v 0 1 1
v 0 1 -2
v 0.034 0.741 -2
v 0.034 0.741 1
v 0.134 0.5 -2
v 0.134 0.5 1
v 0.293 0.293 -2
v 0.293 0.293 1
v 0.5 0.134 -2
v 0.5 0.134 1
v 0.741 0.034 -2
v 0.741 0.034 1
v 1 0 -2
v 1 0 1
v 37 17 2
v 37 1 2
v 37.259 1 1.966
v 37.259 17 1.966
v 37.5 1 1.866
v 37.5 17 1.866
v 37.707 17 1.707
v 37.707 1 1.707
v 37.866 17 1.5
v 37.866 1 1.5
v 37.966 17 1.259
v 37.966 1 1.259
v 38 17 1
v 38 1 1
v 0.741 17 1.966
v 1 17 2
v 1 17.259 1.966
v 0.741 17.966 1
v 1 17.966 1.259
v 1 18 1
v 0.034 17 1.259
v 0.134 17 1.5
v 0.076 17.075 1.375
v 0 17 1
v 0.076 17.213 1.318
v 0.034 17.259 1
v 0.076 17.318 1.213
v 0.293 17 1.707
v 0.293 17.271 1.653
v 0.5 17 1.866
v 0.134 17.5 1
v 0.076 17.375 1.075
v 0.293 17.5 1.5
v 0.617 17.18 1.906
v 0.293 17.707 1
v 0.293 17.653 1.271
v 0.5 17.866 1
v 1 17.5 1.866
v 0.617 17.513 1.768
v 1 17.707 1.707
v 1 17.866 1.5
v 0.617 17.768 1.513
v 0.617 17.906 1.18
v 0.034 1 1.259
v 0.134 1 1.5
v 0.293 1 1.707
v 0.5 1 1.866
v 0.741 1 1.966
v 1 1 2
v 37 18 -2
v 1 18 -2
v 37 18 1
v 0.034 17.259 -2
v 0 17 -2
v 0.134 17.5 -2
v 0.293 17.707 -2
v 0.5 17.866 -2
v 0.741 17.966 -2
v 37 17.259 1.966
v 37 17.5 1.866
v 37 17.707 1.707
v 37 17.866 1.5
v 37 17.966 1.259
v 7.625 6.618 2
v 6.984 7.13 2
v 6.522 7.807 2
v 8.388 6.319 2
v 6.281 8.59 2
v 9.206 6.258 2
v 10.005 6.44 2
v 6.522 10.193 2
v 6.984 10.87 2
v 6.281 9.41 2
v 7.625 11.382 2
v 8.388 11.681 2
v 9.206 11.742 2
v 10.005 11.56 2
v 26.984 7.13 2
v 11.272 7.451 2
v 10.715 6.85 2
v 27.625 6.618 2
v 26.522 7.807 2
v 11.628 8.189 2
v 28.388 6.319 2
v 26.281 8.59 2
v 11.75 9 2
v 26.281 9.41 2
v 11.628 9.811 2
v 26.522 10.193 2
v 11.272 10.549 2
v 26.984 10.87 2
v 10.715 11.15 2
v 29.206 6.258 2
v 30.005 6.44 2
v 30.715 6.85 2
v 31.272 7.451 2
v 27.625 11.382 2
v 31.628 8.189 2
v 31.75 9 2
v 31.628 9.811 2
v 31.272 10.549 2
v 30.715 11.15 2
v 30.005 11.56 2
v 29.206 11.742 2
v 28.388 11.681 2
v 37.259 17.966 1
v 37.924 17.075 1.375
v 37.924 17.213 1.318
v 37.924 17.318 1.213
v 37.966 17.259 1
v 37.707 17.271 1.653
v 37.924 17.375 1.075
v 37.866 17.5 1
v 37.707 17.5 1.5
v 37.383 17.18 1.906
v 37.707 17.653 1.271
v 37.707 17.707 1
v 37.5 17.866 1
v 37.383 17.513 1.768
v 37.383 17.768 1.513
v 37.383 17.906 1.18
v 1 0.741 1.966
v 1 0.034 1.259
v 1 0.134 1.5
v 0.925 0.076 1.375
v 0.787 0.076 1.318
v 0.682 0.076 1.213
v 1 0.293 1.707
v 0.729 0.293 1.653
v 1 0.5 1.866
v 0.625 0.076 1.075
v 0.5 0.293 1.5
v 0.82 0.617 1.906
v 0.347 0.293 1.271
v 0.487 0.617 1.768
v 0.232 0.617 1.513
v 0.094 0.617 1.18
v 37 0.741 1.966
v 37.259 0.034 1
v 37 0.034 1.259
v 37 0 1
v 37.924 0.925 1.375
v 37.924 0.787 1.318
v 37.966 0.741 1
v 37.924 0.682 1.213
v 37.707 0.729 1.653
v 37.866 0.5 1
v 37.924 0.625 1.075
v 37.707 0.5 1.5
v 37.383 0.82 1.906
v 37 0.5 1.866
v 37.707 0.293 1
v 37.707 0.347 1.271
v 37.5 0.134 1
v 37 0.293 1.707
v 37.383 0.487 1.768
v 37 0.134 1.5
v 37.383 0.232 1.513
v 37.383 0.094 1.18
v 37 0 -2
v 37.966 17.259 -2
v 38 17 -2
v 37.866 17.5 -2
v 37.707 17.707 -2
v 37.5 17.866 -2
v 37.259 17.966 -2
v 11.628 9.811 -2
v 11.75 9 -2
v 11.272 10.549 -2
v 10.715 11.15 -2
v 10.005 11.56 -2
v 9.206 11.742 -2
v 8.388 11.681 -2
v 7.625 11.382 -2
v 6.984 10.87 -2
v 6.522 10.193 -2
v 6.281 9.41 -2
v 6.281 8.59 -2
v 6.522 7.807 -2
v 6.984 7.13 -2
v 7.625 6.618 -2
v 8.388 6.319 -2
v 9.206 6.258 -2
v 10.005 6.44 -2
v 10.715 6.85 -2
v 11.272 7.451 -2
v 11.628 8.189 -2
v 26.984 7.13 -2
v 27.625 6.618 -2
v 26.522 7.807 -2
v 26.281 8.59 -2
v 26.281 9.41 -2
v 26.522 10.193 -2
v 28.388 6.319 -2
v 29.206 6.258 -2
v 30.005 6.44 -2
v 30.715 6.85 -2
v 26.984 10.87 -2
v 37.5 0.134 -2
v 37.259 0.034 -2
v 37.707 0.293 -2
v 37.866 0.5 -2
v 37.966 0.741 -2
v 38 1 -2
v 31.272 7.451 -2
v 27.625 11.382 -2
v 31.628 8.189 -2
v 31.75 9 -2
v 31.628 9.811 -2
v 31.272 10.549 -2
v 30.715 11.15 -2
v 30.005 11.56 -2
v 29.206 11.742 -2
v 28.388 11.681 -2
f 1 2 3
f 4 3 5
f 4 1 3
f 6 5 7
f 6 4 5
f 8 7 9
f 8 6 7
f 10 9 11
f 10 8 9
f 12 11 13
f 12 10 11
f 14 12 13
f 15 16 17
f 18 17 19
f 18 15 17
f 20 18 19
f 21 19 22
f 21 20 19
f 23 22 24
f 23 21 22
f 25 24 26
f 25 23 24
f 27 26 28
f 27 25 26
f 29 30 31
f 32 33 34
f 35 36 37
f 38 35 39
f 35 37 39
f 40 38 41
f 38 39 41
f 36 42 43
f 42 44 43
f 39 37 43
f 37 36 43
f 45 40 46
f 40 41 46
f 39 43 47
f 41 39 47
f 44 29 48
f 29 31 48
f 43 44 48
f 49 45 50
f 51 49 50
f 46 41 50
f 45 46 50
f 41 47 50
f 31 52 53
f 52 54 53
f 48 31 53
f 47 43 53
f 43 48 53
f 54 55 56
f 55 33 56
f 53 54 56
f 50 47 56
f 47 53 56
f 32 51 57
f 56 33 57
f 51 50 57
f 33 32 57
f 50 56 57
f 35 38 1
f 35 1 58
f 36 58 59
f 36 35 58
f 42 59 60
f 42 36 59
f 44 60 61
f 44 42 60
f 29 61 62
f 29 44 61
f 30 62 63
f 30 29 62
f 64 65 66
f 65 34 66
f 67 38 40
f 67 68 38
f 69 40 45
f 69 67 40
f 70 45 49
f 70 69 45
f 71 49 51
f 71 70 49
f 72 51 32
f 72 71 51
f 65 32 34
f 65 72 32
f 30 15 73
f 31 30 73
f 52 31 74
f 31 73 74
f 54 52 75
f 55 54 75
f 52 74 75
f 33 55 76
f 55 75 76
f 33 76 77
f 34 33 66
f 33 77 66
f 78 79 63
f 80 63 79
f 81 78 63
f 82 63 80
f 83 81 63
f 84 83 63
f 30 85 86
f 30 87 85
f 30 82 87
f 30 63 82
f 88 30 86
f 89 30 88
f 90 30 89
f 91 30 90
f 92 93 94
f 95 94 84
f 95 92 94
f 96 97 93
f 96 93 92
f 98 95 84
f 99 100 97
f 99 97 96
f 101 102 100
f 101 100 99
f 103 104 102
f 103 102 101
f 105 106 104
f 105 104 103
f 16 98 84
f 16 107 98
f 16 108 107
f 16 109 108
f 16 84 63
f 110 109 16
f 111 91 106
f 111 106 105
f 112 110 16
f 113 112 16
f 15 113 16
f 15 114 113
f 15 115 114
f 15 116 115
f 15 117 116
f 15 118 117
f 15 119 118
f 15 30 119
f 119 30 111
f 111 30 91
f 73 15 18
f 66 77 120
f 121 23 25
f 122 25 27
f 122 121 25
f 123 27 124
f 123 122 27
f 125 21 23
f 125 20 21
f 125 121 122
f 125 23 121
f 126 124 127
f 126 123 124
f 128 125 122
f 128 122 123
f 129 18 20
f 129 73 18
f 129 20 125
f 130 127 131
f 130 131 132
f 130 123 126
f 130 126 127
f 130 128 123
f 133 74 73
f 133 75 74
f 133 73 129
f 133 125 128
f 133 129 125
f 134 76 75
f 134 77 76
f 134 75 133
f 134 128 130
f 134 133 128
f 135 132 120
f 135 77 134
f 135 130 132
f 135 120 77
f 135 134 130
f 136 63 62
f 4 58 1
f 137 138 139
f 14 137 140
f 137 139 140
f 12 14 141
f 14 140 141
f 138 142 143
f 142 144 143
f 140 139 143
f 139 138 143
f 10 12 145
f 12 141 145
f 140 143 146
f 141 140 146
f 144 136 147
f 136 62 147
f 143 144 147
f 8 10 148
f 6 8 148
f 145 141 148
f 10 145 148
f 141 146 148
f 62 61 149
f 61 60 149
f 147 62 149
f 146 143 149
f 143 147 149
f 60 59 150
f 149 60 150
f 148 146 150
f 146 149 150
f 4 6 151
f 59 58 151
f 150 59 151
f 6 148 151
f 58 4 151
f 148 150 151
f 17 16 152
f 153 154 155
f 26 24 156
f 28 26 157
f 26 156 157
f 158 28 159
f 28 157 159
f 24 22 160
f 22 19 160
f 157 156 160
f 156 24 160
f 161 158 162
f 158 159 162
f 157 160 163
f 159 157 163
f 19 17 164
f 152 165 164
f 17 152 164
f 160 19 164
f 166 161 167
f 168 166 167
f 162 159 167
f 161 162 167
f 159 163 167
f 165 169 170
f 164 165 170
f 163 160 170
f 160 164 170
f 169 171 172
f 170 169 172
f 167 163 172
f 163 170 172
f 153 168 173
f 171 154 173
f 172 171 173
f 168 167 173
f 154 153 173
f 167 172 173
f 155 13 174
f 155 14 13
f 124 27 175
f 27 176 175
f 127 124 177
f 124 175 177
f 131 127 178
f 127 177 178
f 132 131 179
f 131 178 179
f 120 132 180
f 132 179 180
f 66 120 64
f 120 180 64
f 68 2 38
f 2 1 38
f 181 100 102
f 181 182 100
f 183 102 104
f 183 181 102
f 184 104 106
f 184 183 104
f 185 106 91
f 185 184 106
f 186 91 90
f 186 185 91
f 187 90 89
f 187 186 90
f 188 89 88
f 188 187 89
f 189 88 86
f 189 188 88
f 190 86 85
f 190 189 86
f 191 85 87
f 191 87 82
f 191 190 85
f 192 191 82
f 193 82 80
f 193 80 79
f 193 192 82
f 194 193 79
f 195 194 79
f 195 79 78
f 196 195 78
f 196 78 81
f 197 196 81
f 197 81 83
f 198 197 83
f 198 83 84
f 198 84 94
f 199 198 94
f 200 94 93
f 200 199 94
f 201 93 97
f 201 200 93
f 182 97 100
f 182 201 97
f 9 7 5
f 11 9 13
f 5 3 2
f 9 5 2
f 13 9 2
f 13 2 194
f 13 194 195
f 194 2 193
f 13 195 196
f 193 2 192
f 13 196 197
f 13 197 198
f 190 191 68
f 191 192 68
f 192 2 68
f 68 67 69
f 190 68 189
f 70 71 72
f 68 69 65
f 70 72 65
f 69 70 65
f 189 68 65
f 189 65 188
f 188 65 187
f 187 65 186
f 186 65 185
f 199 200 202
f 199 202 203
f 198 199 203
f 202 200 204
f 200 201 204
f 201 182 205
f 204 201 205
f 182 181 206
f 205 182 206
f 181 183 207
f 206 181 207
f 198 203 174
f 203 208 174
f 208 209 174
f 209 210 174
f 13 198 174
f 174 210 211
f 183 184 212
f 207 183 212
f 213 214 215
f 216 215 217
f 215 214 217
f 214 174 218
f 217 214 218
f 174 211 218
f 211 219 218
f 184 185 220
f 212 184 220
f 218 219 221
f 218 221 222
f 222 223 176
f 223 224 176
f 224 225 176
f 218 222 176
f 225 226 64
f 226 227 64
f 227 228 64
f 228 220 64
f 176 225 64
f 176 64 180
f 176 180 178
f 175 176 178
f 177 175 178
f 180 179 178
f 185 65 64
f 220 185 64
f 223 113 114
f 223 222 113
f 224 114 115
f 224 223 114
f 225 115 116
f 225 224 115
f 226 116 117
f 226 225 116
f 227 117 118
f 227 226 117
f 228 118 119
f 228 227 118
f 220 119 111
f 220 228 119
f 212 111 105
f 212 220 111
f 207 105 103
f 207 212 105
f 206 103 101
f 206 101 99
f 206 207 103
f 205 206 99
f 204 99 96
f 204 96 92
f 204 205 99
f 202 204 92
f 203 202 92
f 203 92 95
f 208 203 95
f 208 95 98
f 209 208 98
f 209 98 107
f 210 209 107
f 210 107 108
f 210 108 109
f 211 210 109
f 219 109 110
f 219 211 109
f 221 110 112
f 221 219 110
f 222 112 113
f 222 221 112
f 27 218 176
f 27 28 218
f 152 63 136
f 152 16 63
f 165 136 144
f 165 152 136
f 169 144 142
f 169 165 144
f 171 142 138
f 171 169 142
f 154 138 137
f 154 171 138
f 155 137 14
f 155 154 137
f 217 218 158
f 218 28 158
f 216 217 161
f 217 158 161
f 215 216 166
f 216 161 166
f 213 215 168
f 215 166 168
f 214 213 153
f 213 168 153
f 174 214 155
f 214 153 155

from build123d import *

# Parameters (mm, degrees)
SKETCH1_W           = 38
SKETCH1_H           = 18
SKETCH1_R           = 2.75
BOSS_EXTRUDE1_DEPTH = 2
FILLET1_R           = 1


with BuildPart() as part:
    # Sketch1 → Boss-Extrude1 (new, symmetric)
    with BuildSketch(Plane.XY):
        with Locations((19, 9)):
            Rectangle(SKETCH1_W, SKETCH1_H)
        with Locations((9, 9)):
            Circle(SKETCH1_R, mode=Mode.SUBTRACT)
        with Locations((29, 9)):
            Circle(SKETCH1_R, mode=Mode.SUBTRACT)
    extrude(amount=BOSS_EXTRUDE1_DEPTH, both=True)

    # Fillet1
    fillet1_edges = [part.edges().sort_by_distance(p)[0] for p in [
        (19, 18, 2),
        (0, 9, 2),
        (19, 0, 2),
        (38, 9, 2),
        (0, 0, 0),
        (0, 18, 0),
        (38, 18, 0),
        (38, 0, 0),
    ]]
    fillet(fillet1_edges, radius=FILLET1_R)


solid = part.part
